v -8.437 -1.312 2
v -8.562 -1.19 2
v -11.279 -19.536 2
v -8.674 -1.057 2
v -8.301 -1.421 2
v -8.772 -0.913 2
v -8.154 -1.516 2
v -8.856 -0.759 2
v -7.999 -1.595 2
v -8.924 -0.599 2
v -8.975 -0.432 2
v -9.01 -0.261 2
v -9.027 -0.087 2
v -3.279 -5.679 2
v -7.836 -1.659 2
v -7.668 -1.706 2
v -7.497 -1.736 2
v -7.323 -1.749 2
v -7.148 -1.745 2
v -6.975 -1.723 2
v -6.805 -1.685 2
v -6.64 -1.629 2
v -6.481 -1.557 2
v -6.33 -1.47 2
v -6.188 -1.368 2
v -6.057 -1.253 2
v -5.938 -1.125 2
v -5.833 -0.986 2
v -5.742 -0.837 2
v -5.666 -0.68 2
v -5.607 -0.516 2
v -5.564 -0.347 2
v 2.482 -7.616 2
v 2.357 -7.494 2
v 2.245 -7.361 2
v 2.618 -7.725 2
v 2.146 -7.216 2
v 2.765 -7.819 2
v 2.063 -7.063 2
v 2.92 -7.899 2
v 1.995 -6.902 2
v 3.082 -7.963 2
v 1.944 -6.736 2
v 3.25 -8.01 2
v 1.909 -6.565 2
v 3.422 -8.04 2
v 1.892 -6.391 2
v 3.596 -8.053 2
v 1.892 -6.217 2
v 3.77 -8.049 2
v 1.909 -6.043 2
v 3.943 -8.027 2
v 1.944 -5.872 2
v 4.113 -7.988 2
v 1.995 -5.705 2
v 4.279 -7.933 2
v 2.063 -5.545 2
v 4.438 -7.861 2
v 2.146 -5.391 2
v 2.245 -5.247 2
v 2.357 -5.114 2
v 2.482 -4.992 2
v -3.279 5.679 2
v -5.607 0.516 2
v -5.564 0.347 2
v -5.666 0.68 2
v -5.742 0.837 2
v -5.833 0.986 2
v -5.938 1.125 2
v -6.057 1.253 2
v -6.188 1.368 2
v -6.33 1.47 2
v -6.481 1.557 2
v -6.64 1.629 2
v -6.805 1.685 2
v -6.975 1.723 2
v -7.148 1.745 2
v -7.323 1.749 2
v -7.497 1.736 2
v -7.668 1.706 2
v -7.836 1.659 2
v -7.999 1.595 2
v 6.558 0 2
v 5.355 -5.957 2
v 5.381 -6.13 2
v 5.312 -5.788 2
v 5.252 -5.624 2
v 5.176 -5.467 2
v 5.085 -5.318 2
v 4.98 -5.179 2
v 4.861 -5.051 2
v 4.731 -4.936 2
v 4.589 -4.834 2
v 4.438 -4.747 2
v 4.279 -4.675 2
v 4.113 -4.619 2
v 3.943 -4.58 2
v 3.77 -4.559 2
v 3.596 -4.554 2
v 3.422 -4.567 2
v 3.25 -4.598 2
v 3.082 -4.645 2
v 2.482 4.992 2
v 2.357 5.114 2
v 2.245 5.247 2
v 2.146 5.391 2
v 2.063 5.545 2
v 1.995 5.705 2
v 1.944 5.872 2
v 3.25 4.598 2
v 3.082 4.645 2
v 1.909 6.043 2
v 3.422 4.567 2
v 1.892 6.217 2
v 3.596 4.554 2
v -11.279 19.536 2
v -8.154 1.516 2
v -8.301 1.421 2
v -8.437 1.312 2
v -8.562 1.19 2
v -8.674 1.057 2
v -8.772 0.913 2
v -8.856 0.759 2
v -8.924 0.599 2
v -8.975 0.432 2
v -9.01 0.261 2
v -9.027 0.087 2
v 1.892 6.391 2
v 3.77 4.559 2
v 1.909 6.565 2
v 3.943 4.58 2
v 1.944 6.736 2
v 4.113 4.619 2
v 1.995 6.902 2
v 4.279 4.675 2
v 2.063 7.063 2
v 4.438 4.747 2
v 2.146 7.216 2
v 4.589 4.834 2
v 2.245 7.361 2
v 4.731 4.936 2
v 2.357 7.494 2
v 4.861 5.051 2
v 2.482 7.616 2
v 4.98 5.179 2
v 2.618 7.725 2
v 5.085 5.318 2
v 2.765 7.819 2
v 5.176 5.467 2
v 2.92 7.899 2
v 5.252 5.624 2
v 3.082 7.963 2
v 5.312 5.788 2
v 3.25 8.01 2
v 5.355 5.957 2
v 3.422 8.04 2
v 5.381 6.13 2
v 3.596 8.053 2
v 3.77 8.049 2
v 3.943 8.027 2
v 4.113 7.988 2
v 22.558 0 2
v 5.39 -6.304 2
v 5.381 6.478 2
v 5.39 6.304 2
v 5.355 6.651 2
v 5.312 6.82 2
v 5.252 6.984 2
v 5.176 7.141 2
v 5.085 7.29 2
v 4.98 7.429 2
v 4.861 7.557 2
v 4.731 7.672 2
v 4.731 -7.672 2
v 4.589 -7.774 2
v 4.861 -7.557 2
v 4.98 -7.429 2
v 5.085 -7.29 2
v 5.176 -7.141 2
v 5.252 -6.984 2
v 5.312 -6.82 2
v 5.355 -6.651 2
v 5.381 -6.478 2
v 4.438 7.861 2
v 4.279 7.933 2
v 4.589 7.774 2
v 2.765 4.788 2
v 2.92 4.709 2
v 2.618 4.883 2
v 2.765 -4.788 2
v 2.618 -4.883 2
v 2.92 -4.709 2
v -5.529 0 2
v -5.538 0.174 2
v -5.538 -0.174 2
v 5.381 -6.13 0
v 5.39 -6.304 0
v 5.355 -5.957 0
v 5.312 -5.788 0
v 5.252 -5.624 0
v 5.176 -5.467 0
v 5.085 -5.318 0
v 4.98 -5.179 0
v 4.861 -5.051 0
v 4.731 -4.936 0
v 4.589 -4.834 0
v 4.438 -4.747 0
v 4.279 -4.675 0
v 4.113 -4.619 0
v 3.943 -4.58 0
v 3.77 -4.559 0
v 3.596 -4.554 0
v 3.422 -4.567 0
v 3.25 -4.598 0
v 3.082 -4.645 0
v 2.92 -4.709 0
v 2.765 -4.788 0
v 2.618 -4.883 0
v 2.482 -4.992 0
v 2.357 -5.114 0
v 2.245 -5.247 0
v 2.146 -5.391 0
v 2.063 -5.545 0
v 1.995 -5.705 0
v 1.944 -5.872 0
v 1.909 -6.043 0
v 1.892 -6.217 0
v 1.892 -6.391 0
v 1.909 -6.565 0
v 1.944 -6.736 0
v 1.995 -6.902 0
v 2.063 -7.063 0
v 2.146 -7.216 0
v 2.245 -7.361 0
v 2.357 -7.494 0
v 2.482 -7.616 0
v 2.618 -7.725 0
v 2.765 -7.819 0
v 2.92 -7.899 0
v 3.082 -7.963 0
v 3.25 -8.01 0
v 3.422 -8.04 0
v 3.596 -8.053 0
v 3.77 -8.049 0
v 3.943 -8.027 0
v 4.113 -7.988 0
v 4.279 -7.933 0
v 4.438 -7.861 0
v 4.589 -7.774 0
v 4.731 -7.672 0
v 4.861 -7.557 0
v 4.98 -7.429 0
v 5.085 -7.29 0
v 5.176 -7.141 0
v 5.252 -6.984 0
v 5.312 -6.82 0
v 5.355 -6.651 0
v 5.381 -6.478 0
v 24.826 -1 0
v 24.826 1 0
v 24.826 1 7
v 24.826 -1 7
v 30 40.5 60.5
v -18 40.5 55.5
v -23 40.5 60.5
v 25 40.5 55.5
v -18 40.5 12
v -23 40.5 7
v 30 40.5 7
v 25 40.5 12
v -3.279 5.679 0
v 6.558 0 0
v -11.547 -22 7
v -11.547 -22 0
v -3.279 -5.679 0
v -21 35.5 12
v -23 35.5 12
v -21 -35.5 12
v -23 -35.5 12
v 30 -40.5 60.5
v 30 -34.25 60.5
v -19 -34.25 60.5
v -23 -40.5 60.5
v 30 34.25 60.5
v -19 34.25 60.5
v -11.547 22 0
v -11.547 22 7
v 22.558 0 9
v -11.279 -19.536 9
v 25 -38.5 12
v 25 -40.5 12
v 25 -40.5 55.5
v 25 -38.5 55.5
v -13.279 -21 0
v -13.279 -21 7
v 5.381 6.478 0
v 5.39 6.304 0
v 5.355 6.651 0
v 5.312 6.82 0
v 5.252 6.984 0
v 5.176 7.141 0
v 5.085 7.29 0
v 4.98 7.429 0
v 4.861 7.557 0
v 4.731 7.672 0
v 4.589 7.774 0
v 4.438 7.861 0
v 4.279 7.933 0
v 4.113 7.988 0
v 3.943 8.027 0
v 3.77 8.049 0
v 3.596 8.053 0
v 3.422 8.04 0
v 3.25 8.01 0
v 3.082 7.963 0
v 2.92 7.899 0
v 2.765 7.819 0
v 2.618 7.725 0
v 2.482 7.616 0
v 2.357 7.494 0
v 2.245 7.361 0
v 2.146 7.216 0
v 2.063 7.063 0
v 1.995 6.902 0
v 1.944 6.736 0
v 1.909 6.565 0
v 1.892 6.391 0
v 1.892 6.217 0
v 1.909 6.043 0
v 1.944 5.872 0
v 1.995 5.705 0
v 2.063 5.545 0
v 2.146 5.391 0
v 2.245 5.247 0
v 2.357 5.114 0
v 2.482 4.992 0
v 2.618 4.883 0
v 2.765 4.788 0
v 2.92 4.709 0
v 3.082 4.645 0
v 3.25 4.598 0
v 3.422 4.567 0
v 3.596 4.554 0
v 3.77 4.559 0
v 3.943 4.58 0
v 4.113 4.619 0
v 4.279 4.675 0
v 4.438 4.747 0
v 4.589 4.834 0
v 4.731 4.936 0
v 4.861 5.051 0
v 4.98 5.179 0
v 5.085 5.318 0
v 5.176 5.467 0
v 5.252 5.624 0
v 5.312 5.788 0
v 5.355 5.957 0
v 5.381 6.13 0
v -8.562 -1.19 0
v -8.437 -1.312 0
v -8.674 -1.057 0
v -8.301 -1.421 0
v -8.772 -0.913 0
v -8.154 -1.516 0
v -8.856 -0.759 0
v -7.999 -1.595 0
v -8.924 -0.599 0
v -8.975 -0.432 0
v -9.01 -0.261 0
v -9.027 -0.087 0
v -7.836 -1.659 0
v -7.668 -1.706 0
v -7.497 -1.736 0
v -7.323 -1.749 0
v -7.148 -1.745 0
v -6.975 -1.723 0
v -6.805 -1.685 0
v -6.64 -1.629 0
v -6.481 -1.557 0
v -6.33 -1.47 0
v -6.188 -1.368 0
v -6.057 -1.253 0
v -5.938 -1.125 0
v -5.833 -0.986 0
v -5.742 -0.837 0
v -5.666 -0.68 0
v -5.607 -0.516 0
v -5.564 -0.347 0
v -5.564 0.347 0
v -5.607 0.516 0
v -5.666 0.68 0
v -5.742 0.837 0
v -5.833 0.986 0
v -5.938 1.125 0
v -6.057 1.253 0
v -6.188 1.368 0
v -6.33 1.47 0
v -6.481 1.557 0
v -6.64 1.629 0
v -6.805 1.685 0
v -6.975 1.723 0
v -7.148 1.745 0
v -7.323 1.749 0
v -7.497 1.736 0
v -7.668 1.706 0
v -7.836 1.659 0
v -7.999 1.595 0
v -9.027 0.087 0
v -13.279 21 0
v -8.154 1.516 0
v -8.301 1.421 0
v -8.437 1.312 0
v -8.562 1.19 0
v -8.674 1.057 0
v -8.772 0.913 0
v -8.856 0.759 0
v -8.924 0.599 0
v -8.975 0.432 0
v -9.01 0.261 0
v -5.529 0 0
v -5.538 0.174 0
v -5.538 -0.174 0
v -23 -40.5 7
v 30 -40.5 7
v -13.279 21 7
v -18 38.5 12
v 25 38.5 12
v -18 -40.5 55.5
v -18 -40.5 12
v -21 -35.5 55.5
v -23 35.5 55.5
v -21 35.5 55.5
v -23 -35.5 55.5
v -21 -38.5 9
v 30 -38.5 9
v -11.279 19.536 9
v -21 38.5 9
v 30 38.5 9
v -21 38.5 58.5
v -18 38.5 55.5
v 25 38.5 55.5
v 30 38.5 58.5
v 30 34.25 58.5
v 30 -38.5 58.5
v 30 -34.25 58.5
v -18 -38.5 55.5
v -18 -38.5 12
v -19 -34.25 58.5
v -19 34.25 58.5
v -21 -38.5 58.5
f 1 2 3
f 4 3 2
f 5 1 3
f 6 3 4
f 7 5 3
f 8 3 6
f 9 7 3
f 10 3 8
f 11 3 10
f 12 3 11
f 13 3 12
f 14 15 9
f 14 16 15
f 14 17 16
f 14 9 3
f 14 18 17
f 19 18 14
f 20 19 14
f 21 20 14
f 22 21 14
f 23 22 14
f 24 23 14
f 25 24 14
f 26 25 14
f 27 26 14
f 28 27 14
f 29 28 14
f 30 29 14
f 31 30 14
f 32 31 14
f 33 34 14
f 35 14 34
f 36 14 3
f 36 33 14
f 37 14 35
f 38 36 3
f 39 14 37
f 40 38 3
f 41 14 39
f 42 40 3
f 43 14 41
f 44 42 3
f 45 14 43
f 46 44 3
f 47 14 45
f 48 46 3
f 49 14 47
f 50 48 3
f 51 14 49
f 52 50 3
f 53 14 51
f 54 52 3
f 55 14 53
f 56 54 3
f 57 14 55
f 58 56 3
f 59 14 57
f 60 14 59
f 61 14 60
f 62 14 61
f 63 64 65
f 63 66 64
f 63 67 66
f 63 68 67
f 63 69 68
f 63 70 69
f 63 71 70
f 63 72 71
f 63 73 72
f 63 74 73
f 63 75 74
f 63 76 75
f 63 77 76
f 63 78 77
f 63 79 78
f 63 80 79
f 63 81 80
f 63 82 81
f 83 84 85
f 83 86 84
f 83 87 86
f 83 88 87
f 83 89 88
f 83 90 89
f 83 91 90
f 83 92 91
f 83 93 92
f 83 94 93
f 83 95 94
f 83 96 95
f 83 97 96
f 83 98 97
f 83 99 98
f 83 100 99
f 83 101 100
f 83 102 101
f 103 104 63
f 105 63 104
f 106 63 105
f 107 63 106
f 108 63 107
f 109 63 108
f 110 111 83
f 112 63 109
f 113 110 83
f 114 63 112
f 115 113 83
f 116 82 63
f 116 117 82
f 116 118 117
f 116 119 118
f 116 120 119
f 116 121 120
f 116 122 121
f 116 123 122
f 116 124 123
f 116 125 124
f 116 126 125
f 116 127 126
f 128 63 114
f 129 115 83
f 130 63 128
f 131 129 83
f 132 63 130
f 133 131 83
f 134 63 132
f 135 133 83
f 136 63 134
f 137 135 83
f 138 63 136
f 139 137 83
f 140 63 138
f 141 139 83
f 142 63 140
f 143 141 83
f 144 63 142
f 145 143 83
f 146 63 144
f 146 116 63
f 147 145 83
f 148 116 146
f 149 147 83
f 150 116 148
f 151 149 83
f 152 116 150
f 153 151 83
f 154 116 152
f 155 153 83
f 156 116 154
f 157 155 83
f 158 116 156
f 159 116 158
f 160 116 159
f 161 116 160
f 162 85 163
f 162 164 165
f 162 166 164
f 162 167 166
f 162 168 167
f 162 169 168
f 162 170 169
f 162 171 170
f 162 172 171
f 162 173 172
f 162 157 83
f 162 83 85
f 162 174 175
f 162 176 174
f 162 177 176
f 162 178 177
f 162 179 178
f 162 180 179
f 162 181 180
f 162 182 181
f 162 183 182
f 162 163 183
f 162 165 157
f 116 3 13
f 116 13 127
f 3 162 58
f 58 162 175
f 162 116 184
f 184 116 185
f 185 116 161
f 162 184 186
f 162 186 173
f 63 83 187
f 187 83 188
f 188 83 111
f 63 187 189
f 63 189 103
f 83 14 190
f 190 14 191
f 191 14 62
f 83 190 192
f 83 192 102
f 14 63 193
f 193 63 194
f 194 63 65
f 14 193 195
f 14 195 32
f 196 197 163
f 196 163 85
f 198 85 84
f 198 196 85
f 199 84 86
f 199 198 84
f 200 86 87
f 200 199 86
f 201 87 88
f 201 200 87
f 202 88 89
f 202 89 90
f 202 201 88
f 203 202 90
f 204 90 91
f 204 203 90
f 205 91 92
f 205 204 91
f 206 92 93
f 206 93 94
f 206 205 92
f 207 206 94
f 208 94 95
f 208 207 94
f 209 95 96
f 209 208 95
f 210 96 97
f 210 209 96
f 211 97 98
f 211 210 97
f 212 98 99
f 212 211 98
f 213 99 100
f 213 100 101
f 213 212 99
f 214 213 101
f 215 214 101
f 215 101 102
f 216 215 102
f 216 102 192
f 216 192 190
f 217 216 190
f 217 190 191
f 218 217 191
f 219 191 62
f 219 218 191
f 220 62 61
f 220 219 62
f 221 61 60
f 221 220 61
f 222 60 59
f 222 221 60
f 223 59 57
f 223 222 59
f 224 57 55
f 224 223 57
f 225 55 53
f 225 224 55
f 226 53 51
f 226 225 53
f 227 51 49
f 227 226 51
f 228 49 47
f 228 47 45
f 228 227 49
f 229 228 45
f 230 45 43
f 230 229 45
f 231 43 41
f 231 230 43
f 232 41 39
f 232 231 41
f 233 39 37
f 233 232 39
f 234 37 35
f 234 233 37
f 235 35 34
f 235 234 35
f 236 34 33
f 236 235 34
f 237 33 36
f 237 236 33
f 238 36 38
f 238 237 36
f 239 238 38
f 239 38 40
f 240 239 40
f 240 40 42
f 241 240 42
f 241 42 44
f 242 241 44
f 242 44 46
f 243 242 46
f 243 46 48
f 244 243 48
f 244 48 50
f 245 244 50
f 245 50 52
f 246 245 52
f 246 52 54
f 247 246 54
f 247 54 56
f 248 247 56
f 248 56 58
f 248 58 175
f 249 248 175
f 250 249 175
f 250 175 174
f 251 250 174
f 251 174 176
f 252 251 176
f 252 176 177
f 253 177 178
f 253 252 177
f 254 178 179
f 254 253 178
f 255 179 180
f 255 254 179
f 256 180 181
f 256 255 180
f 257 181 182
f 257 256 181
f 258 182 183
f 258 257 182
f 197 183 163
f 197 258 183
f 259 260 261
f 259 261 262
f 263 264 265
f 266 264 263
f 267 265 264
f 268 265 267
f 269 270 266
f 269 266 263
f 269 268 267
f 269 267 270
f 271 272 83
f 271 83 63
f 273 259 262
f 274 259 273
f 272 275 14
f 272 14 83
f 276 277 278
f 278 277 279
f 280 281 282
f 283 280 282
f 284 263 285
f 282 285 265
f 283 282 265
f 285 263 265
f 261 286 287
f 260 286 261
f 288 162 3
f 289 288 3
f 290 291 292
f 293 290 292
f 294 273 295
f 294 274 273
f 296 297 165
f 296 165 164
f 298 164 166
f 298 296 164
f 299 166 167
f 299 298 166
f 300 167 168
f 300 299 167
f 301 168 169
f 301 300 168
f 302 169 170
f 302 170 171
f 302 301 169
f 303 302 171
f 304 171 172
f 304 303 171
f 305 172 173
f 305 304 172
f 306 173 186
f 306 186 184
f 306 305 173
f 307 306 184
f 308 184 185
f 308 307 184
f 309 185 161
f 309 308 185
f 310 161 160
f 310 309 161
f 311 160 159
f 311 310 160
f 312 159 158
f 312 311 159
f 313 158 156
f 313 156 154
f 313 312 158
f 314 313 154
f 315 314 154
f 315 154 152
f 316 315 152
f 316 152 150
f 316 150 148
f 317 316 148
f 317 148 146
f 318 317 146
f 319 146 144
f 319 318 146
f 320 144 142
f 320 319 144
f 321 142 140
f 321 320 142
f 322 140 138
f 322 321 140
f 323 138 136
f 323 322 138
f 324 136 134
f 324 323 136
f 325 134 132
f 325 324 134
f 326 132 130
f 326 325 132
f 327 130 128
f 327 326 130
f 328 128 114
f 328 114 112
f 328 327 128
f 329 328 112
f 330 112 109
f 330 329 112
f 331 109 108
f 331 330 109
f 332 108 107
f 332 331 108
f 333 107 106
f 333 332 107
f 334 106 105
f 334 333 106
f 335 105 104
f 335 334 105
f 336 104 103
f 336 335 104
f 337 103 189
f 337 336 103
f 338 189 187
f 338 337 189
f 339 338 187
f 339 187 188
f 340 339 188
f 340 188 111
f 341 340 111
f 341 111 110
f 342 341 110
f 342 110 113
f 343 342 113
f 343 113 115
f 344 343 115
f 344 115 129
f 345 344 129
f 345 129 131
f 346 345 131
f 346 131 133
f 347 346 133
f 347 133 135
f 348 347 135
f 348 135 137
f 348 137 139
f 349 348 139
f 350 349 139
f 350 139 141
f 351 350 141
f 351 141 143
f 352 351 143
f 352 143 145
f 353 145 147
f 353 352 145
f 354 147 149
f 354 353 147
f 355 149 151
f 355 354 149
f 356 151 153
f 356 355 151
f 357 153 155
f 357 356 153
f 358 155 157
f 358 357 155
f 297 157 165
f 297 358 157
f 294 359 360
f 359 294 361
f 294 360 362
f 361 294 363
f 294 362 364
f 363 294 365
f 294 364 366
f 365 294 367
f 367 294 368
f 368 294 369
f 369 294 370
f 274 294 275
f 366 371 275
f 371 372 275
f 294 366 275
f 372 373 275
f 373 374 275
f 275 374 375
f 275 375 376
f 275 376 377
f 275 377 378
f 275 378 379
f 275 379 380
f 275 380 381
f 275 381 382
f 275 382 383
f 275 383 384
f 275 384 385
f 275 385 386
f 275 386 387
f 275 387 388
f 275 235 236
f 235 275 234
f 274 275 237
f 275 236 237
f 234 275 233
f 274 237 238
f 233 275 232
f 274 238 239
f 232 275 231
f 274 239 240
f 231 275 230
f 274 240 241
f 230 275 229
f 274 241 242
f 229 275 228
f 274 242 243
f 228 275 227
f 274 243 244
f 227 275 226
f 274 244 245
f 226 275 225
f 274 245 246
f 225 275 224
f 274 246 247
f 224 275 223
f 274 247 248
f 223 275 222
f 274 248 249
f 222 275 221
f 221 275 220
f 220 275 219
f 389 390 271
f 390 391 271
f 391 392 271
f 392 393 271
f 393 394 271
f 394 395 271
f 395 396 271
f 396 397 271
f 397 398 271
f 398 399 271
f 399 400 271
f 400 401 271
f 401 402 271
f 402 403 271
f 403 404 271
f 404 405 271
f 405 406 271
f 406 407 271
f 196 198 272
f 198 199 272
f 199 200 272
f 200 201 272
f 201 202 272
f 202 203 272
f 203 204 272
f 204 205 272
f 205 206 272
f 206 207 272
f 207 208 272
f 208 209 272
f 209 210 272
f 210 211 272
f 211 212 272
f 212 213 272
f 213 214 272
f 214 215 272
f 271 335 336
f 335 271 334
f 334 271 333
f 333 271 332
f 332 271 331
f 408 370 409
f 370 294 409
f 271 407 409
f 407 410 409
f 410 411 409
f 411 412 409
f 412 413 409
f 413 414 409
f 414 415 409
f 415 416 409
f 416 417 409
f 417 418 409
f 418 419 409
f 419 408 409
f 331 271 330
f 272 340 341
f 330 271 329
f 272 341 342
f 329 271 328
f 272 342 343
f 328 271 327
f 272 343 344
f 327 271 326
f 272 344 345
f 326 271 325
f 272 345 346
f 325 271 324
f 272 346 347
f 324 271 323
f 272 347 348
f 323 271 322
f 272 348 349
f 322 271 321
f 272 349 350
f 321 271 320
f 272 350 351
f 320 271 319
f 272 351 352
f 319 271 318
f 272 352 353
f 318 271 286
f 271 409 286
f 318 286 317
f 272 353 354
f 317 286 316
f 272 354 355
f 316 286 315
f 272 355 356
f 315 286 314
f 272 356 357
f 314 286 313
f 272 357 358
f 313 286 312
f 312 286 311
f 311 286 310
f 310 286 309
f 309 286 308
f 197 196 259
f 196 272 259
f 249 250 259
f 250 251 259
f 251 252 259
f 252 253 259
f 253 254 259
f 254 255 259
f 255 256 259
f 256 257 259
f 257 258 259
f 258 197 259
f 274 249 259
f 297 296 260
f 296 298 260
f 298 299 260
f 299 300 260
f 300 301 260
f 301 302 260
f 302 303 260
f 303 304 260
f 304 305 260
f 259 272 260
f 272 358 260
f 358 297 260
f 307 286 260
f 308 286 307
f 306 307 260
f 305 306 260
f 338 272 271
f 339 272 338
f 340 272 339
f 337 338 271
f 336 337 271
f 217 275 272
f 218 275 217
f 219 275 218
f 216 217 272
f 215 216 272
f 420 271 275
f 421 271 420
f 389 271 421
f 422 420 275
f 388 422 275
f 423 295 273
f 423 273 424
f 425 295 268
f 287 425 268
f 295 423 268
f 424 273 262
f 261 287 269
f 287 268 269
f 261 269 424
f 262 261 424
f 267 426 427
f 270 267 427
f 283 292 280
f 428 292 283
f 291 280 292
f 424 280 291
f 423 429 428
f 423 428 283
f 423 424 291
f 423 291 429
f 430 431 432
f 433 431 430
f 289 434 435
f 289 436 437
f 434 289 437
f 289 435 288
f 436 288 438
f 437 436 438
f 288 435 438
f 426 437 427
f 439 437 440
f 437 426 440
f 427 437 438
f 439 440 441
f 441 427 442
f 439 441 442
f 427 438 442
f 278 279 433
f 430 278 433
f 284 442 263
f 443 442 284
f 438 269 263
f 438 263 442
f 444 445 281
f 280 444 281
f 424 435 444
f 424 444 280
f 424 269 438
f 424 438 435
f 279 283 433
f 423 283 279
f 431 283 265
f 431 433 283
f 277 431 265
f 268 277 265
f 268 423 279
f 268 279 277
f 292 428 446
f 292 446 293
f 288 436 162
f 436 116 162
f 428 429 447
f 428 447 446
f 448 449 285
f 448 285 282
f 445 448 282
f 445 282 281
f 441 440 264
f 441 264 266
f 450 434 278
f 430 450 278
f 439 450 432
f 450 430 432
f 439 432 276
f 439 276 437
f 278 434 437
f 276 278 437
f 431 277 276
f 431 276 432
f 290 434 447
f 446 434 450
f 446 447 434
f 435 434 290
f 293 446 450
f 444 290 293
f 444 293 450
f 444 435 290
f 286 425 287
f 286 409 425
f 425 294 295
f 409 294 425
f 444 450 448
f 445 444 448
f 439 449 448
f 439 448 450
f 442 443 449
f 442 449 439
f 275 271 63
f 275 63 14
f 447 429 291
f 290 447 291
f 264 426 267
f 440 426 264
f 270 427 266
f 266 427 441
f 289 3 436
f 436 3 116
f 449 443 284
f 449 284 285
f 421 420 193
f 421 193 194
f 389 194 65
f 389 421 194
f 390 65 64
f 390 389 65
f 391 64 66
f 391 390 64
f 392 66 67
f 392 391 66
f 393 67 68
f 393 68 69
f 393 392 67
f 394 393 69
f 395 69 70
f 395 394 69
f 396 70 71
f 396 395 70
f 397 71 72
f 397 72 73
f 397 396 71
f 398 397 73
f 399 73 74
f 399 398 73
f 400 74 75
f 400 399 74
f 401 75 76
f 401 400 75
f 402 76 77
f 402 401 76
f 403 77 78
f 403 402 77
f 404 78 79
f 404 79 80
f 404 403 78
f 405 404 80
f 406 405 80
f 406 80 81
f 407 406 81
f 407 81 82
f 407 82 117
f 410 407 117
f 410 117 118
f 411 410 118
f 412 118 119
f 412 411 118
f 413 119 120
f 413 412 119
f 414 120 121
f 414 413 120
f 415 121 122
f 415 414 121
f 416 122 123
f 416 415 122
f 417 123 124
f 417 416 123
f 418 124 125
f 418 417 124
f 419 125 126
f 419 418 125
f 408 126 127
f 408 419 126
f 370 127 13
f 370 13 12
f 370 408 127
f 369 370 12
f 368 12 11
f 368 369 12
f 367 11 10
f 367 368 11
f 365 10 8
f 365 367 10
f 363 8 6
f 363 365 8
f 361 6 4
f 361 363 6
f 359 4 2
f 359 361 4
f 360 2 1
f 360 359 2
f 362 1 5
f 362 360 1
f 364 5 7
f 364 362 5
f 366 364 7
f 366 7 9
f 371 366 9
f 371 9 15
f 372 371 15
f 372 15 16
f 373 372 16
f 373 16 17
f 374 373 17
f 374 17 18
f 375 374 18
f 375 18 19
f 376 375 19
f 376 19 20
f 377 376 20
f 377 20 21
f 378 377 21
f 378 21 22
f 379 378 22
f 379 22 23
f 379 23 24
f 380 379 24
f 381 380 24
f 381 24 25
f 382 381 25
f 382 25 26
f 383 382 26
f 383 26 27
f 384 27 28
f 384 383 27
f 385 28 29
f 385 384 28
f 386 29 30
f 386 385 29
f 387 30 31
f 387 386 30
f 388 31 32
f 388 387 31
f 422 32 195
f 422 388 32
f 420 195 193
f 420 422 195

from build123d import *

# Parameters (mm, degrees)
SKETCH_R        = 1.75
PAD_DEPTH       = 2
PAD001_DEPTH    = 5
SKETCH002_W     = 53
SKETCH002_H     = 81
PAD002_DEPTH    = 2
SKETCH003_W     = 53
SKETCH003_H     = 81
SKETCH003_W_2   = 49
SKETCH003_H_2   = 77
PAD003_DEPTH    = 49.5
PAD004_DEPTH    = 2
SKETCH005_W     = 43
SKETCH005_H     = 43.5
POCKET_DEPTH    = 81
SKETCH006_W     = 71
SKETCH006_H     = 43.5
POCKET001_DEPTH = 2
SKETCH007_W     = 77
SKETCH007_H     = 49.5
POCKET002_DEPTH = 5


with BuildPart() as part:
    # Sketch → Pad (new body)
    with BuildSketch(Plane.XY):
        Polygon((-13.279056, 21), (-13.279056, -21), (-11.547005, -22), (24.826062, -1), (24.826062, 1), (-11.547005, 22), align=None)
        with Locations((-7.279056, 0)):
            Circle(SKETCH_R, mode=Mode.SUBTRACT)
        with Locations((3.639528, 6.303848)):
            Circle(SKETCH_R, mode=Mode.SUBTRACT)
        with Locations((3.639528, -6.303848)):
            Circle(SKETCH_R, mode=Mode.SUBTRACT)
        Polygon((6.558112, 0), (-3.279056, 5.679492), (-3.279056, -5.679492), align=None, mode=Mode.SUBTRACT)
    extrude(amount=PAD_DEPTH)

    # Sketch001 (on Face14 of Pad) → Pad001 (join)
    with BuildSketch(Plane.XY.offset(2)):
        Polygon((-13.279056, 21), (-11.547005, 22), (24.826062, 1), (24.826062, -1), (-11.547005, -22), (-13.279056, -21), align=None)
        Polygon((22.558112, 0), (-11.279056, 19.535898), (-11.279056, -19.535898), align=None, mode=Mode.SUBTRACT)
    extrude(amount=PAD001_DEPTH)

    # Sketch002 (on Face17 of Pad001) → Pad002 (join)
    with BuildSketch(Plane.XY.offset(7)):
        with Locations((3.5, 0)):
            Rectangle(SKETCH002_W, SKETCH002_H)
        Polygon((-11.279056, 19.535898), (22.558112, 0), (-11.279056, -19.535898), align=None, mode=Mode.SUBTRACT)
    extrude(amount=PAD002_DEPTH)

    # Sketch003 (on Face29 of Pad002) → Pad003 (join)
    with BuildSketch(Plane.XY.offset(9)):
        with Locations((3.5, 0)):
            Rectangle(SKETCH003_W, SKETCH003_H)
        with Locations((3.5, 0)):
            Rectangle(SKETCH003_W_2, SKETCH003_H_2, mode=Mode.SUBTRACT)
    extrude(amount=PAD003_DEPTH)

    # Sketch004 (on Face36 of Pad003) → Pad004 (join)
    with BuildSketch(Plane.XY.offset(58.5)):
        Polygon((-23, 40.5), (30, 40.5), (30, 34.25), (-19, 34.25), (-19, -34.25), (30, -34.25), (30, -40.5), (-23, -40.5), align=None)
    extrude(amount=PAD004_DEPTH)

    # Sketch005 (on Face32 of Pad004) → Pocket (cut)
    with BuildSketch(Plane.XZ.offset(40.5)):
        with Locations((3.5, 33.75)):
            Rectangle(SKETCH005_W, SKETCH005_H)
    extrude(amount=-POCKET_DEPTH, mode=Mode.SUBTRACT)

    # Sketch006 (on Face30 of Pocket) → Pocket001 (cut)
    with BuildSketch(Plane(origin=(-23, 0, 0), x_dir=(0, -1, 0), z_dir=(-1, 0, 0))):
        with Locations((0, 33.75)):
            Rectangle(SKETCH006_W, SKETCH006_H)
    extrude(amount=-POCKET001_DEPTH, mode=Mode.SUBTRACT)

    # Sketch007 (on Face31 of Pocket001) → Pocket002 (cut)
    with BuildSketch(Plane.YZ.offset(30)):
        with Locations((0, 33.75)):
            Rectangle(SKETCH007_W, SKETCH007_H)
    extrude(amount=-POCKET002_DEPTH, mode=Mode.SUBTRACT)


solid = part.part
